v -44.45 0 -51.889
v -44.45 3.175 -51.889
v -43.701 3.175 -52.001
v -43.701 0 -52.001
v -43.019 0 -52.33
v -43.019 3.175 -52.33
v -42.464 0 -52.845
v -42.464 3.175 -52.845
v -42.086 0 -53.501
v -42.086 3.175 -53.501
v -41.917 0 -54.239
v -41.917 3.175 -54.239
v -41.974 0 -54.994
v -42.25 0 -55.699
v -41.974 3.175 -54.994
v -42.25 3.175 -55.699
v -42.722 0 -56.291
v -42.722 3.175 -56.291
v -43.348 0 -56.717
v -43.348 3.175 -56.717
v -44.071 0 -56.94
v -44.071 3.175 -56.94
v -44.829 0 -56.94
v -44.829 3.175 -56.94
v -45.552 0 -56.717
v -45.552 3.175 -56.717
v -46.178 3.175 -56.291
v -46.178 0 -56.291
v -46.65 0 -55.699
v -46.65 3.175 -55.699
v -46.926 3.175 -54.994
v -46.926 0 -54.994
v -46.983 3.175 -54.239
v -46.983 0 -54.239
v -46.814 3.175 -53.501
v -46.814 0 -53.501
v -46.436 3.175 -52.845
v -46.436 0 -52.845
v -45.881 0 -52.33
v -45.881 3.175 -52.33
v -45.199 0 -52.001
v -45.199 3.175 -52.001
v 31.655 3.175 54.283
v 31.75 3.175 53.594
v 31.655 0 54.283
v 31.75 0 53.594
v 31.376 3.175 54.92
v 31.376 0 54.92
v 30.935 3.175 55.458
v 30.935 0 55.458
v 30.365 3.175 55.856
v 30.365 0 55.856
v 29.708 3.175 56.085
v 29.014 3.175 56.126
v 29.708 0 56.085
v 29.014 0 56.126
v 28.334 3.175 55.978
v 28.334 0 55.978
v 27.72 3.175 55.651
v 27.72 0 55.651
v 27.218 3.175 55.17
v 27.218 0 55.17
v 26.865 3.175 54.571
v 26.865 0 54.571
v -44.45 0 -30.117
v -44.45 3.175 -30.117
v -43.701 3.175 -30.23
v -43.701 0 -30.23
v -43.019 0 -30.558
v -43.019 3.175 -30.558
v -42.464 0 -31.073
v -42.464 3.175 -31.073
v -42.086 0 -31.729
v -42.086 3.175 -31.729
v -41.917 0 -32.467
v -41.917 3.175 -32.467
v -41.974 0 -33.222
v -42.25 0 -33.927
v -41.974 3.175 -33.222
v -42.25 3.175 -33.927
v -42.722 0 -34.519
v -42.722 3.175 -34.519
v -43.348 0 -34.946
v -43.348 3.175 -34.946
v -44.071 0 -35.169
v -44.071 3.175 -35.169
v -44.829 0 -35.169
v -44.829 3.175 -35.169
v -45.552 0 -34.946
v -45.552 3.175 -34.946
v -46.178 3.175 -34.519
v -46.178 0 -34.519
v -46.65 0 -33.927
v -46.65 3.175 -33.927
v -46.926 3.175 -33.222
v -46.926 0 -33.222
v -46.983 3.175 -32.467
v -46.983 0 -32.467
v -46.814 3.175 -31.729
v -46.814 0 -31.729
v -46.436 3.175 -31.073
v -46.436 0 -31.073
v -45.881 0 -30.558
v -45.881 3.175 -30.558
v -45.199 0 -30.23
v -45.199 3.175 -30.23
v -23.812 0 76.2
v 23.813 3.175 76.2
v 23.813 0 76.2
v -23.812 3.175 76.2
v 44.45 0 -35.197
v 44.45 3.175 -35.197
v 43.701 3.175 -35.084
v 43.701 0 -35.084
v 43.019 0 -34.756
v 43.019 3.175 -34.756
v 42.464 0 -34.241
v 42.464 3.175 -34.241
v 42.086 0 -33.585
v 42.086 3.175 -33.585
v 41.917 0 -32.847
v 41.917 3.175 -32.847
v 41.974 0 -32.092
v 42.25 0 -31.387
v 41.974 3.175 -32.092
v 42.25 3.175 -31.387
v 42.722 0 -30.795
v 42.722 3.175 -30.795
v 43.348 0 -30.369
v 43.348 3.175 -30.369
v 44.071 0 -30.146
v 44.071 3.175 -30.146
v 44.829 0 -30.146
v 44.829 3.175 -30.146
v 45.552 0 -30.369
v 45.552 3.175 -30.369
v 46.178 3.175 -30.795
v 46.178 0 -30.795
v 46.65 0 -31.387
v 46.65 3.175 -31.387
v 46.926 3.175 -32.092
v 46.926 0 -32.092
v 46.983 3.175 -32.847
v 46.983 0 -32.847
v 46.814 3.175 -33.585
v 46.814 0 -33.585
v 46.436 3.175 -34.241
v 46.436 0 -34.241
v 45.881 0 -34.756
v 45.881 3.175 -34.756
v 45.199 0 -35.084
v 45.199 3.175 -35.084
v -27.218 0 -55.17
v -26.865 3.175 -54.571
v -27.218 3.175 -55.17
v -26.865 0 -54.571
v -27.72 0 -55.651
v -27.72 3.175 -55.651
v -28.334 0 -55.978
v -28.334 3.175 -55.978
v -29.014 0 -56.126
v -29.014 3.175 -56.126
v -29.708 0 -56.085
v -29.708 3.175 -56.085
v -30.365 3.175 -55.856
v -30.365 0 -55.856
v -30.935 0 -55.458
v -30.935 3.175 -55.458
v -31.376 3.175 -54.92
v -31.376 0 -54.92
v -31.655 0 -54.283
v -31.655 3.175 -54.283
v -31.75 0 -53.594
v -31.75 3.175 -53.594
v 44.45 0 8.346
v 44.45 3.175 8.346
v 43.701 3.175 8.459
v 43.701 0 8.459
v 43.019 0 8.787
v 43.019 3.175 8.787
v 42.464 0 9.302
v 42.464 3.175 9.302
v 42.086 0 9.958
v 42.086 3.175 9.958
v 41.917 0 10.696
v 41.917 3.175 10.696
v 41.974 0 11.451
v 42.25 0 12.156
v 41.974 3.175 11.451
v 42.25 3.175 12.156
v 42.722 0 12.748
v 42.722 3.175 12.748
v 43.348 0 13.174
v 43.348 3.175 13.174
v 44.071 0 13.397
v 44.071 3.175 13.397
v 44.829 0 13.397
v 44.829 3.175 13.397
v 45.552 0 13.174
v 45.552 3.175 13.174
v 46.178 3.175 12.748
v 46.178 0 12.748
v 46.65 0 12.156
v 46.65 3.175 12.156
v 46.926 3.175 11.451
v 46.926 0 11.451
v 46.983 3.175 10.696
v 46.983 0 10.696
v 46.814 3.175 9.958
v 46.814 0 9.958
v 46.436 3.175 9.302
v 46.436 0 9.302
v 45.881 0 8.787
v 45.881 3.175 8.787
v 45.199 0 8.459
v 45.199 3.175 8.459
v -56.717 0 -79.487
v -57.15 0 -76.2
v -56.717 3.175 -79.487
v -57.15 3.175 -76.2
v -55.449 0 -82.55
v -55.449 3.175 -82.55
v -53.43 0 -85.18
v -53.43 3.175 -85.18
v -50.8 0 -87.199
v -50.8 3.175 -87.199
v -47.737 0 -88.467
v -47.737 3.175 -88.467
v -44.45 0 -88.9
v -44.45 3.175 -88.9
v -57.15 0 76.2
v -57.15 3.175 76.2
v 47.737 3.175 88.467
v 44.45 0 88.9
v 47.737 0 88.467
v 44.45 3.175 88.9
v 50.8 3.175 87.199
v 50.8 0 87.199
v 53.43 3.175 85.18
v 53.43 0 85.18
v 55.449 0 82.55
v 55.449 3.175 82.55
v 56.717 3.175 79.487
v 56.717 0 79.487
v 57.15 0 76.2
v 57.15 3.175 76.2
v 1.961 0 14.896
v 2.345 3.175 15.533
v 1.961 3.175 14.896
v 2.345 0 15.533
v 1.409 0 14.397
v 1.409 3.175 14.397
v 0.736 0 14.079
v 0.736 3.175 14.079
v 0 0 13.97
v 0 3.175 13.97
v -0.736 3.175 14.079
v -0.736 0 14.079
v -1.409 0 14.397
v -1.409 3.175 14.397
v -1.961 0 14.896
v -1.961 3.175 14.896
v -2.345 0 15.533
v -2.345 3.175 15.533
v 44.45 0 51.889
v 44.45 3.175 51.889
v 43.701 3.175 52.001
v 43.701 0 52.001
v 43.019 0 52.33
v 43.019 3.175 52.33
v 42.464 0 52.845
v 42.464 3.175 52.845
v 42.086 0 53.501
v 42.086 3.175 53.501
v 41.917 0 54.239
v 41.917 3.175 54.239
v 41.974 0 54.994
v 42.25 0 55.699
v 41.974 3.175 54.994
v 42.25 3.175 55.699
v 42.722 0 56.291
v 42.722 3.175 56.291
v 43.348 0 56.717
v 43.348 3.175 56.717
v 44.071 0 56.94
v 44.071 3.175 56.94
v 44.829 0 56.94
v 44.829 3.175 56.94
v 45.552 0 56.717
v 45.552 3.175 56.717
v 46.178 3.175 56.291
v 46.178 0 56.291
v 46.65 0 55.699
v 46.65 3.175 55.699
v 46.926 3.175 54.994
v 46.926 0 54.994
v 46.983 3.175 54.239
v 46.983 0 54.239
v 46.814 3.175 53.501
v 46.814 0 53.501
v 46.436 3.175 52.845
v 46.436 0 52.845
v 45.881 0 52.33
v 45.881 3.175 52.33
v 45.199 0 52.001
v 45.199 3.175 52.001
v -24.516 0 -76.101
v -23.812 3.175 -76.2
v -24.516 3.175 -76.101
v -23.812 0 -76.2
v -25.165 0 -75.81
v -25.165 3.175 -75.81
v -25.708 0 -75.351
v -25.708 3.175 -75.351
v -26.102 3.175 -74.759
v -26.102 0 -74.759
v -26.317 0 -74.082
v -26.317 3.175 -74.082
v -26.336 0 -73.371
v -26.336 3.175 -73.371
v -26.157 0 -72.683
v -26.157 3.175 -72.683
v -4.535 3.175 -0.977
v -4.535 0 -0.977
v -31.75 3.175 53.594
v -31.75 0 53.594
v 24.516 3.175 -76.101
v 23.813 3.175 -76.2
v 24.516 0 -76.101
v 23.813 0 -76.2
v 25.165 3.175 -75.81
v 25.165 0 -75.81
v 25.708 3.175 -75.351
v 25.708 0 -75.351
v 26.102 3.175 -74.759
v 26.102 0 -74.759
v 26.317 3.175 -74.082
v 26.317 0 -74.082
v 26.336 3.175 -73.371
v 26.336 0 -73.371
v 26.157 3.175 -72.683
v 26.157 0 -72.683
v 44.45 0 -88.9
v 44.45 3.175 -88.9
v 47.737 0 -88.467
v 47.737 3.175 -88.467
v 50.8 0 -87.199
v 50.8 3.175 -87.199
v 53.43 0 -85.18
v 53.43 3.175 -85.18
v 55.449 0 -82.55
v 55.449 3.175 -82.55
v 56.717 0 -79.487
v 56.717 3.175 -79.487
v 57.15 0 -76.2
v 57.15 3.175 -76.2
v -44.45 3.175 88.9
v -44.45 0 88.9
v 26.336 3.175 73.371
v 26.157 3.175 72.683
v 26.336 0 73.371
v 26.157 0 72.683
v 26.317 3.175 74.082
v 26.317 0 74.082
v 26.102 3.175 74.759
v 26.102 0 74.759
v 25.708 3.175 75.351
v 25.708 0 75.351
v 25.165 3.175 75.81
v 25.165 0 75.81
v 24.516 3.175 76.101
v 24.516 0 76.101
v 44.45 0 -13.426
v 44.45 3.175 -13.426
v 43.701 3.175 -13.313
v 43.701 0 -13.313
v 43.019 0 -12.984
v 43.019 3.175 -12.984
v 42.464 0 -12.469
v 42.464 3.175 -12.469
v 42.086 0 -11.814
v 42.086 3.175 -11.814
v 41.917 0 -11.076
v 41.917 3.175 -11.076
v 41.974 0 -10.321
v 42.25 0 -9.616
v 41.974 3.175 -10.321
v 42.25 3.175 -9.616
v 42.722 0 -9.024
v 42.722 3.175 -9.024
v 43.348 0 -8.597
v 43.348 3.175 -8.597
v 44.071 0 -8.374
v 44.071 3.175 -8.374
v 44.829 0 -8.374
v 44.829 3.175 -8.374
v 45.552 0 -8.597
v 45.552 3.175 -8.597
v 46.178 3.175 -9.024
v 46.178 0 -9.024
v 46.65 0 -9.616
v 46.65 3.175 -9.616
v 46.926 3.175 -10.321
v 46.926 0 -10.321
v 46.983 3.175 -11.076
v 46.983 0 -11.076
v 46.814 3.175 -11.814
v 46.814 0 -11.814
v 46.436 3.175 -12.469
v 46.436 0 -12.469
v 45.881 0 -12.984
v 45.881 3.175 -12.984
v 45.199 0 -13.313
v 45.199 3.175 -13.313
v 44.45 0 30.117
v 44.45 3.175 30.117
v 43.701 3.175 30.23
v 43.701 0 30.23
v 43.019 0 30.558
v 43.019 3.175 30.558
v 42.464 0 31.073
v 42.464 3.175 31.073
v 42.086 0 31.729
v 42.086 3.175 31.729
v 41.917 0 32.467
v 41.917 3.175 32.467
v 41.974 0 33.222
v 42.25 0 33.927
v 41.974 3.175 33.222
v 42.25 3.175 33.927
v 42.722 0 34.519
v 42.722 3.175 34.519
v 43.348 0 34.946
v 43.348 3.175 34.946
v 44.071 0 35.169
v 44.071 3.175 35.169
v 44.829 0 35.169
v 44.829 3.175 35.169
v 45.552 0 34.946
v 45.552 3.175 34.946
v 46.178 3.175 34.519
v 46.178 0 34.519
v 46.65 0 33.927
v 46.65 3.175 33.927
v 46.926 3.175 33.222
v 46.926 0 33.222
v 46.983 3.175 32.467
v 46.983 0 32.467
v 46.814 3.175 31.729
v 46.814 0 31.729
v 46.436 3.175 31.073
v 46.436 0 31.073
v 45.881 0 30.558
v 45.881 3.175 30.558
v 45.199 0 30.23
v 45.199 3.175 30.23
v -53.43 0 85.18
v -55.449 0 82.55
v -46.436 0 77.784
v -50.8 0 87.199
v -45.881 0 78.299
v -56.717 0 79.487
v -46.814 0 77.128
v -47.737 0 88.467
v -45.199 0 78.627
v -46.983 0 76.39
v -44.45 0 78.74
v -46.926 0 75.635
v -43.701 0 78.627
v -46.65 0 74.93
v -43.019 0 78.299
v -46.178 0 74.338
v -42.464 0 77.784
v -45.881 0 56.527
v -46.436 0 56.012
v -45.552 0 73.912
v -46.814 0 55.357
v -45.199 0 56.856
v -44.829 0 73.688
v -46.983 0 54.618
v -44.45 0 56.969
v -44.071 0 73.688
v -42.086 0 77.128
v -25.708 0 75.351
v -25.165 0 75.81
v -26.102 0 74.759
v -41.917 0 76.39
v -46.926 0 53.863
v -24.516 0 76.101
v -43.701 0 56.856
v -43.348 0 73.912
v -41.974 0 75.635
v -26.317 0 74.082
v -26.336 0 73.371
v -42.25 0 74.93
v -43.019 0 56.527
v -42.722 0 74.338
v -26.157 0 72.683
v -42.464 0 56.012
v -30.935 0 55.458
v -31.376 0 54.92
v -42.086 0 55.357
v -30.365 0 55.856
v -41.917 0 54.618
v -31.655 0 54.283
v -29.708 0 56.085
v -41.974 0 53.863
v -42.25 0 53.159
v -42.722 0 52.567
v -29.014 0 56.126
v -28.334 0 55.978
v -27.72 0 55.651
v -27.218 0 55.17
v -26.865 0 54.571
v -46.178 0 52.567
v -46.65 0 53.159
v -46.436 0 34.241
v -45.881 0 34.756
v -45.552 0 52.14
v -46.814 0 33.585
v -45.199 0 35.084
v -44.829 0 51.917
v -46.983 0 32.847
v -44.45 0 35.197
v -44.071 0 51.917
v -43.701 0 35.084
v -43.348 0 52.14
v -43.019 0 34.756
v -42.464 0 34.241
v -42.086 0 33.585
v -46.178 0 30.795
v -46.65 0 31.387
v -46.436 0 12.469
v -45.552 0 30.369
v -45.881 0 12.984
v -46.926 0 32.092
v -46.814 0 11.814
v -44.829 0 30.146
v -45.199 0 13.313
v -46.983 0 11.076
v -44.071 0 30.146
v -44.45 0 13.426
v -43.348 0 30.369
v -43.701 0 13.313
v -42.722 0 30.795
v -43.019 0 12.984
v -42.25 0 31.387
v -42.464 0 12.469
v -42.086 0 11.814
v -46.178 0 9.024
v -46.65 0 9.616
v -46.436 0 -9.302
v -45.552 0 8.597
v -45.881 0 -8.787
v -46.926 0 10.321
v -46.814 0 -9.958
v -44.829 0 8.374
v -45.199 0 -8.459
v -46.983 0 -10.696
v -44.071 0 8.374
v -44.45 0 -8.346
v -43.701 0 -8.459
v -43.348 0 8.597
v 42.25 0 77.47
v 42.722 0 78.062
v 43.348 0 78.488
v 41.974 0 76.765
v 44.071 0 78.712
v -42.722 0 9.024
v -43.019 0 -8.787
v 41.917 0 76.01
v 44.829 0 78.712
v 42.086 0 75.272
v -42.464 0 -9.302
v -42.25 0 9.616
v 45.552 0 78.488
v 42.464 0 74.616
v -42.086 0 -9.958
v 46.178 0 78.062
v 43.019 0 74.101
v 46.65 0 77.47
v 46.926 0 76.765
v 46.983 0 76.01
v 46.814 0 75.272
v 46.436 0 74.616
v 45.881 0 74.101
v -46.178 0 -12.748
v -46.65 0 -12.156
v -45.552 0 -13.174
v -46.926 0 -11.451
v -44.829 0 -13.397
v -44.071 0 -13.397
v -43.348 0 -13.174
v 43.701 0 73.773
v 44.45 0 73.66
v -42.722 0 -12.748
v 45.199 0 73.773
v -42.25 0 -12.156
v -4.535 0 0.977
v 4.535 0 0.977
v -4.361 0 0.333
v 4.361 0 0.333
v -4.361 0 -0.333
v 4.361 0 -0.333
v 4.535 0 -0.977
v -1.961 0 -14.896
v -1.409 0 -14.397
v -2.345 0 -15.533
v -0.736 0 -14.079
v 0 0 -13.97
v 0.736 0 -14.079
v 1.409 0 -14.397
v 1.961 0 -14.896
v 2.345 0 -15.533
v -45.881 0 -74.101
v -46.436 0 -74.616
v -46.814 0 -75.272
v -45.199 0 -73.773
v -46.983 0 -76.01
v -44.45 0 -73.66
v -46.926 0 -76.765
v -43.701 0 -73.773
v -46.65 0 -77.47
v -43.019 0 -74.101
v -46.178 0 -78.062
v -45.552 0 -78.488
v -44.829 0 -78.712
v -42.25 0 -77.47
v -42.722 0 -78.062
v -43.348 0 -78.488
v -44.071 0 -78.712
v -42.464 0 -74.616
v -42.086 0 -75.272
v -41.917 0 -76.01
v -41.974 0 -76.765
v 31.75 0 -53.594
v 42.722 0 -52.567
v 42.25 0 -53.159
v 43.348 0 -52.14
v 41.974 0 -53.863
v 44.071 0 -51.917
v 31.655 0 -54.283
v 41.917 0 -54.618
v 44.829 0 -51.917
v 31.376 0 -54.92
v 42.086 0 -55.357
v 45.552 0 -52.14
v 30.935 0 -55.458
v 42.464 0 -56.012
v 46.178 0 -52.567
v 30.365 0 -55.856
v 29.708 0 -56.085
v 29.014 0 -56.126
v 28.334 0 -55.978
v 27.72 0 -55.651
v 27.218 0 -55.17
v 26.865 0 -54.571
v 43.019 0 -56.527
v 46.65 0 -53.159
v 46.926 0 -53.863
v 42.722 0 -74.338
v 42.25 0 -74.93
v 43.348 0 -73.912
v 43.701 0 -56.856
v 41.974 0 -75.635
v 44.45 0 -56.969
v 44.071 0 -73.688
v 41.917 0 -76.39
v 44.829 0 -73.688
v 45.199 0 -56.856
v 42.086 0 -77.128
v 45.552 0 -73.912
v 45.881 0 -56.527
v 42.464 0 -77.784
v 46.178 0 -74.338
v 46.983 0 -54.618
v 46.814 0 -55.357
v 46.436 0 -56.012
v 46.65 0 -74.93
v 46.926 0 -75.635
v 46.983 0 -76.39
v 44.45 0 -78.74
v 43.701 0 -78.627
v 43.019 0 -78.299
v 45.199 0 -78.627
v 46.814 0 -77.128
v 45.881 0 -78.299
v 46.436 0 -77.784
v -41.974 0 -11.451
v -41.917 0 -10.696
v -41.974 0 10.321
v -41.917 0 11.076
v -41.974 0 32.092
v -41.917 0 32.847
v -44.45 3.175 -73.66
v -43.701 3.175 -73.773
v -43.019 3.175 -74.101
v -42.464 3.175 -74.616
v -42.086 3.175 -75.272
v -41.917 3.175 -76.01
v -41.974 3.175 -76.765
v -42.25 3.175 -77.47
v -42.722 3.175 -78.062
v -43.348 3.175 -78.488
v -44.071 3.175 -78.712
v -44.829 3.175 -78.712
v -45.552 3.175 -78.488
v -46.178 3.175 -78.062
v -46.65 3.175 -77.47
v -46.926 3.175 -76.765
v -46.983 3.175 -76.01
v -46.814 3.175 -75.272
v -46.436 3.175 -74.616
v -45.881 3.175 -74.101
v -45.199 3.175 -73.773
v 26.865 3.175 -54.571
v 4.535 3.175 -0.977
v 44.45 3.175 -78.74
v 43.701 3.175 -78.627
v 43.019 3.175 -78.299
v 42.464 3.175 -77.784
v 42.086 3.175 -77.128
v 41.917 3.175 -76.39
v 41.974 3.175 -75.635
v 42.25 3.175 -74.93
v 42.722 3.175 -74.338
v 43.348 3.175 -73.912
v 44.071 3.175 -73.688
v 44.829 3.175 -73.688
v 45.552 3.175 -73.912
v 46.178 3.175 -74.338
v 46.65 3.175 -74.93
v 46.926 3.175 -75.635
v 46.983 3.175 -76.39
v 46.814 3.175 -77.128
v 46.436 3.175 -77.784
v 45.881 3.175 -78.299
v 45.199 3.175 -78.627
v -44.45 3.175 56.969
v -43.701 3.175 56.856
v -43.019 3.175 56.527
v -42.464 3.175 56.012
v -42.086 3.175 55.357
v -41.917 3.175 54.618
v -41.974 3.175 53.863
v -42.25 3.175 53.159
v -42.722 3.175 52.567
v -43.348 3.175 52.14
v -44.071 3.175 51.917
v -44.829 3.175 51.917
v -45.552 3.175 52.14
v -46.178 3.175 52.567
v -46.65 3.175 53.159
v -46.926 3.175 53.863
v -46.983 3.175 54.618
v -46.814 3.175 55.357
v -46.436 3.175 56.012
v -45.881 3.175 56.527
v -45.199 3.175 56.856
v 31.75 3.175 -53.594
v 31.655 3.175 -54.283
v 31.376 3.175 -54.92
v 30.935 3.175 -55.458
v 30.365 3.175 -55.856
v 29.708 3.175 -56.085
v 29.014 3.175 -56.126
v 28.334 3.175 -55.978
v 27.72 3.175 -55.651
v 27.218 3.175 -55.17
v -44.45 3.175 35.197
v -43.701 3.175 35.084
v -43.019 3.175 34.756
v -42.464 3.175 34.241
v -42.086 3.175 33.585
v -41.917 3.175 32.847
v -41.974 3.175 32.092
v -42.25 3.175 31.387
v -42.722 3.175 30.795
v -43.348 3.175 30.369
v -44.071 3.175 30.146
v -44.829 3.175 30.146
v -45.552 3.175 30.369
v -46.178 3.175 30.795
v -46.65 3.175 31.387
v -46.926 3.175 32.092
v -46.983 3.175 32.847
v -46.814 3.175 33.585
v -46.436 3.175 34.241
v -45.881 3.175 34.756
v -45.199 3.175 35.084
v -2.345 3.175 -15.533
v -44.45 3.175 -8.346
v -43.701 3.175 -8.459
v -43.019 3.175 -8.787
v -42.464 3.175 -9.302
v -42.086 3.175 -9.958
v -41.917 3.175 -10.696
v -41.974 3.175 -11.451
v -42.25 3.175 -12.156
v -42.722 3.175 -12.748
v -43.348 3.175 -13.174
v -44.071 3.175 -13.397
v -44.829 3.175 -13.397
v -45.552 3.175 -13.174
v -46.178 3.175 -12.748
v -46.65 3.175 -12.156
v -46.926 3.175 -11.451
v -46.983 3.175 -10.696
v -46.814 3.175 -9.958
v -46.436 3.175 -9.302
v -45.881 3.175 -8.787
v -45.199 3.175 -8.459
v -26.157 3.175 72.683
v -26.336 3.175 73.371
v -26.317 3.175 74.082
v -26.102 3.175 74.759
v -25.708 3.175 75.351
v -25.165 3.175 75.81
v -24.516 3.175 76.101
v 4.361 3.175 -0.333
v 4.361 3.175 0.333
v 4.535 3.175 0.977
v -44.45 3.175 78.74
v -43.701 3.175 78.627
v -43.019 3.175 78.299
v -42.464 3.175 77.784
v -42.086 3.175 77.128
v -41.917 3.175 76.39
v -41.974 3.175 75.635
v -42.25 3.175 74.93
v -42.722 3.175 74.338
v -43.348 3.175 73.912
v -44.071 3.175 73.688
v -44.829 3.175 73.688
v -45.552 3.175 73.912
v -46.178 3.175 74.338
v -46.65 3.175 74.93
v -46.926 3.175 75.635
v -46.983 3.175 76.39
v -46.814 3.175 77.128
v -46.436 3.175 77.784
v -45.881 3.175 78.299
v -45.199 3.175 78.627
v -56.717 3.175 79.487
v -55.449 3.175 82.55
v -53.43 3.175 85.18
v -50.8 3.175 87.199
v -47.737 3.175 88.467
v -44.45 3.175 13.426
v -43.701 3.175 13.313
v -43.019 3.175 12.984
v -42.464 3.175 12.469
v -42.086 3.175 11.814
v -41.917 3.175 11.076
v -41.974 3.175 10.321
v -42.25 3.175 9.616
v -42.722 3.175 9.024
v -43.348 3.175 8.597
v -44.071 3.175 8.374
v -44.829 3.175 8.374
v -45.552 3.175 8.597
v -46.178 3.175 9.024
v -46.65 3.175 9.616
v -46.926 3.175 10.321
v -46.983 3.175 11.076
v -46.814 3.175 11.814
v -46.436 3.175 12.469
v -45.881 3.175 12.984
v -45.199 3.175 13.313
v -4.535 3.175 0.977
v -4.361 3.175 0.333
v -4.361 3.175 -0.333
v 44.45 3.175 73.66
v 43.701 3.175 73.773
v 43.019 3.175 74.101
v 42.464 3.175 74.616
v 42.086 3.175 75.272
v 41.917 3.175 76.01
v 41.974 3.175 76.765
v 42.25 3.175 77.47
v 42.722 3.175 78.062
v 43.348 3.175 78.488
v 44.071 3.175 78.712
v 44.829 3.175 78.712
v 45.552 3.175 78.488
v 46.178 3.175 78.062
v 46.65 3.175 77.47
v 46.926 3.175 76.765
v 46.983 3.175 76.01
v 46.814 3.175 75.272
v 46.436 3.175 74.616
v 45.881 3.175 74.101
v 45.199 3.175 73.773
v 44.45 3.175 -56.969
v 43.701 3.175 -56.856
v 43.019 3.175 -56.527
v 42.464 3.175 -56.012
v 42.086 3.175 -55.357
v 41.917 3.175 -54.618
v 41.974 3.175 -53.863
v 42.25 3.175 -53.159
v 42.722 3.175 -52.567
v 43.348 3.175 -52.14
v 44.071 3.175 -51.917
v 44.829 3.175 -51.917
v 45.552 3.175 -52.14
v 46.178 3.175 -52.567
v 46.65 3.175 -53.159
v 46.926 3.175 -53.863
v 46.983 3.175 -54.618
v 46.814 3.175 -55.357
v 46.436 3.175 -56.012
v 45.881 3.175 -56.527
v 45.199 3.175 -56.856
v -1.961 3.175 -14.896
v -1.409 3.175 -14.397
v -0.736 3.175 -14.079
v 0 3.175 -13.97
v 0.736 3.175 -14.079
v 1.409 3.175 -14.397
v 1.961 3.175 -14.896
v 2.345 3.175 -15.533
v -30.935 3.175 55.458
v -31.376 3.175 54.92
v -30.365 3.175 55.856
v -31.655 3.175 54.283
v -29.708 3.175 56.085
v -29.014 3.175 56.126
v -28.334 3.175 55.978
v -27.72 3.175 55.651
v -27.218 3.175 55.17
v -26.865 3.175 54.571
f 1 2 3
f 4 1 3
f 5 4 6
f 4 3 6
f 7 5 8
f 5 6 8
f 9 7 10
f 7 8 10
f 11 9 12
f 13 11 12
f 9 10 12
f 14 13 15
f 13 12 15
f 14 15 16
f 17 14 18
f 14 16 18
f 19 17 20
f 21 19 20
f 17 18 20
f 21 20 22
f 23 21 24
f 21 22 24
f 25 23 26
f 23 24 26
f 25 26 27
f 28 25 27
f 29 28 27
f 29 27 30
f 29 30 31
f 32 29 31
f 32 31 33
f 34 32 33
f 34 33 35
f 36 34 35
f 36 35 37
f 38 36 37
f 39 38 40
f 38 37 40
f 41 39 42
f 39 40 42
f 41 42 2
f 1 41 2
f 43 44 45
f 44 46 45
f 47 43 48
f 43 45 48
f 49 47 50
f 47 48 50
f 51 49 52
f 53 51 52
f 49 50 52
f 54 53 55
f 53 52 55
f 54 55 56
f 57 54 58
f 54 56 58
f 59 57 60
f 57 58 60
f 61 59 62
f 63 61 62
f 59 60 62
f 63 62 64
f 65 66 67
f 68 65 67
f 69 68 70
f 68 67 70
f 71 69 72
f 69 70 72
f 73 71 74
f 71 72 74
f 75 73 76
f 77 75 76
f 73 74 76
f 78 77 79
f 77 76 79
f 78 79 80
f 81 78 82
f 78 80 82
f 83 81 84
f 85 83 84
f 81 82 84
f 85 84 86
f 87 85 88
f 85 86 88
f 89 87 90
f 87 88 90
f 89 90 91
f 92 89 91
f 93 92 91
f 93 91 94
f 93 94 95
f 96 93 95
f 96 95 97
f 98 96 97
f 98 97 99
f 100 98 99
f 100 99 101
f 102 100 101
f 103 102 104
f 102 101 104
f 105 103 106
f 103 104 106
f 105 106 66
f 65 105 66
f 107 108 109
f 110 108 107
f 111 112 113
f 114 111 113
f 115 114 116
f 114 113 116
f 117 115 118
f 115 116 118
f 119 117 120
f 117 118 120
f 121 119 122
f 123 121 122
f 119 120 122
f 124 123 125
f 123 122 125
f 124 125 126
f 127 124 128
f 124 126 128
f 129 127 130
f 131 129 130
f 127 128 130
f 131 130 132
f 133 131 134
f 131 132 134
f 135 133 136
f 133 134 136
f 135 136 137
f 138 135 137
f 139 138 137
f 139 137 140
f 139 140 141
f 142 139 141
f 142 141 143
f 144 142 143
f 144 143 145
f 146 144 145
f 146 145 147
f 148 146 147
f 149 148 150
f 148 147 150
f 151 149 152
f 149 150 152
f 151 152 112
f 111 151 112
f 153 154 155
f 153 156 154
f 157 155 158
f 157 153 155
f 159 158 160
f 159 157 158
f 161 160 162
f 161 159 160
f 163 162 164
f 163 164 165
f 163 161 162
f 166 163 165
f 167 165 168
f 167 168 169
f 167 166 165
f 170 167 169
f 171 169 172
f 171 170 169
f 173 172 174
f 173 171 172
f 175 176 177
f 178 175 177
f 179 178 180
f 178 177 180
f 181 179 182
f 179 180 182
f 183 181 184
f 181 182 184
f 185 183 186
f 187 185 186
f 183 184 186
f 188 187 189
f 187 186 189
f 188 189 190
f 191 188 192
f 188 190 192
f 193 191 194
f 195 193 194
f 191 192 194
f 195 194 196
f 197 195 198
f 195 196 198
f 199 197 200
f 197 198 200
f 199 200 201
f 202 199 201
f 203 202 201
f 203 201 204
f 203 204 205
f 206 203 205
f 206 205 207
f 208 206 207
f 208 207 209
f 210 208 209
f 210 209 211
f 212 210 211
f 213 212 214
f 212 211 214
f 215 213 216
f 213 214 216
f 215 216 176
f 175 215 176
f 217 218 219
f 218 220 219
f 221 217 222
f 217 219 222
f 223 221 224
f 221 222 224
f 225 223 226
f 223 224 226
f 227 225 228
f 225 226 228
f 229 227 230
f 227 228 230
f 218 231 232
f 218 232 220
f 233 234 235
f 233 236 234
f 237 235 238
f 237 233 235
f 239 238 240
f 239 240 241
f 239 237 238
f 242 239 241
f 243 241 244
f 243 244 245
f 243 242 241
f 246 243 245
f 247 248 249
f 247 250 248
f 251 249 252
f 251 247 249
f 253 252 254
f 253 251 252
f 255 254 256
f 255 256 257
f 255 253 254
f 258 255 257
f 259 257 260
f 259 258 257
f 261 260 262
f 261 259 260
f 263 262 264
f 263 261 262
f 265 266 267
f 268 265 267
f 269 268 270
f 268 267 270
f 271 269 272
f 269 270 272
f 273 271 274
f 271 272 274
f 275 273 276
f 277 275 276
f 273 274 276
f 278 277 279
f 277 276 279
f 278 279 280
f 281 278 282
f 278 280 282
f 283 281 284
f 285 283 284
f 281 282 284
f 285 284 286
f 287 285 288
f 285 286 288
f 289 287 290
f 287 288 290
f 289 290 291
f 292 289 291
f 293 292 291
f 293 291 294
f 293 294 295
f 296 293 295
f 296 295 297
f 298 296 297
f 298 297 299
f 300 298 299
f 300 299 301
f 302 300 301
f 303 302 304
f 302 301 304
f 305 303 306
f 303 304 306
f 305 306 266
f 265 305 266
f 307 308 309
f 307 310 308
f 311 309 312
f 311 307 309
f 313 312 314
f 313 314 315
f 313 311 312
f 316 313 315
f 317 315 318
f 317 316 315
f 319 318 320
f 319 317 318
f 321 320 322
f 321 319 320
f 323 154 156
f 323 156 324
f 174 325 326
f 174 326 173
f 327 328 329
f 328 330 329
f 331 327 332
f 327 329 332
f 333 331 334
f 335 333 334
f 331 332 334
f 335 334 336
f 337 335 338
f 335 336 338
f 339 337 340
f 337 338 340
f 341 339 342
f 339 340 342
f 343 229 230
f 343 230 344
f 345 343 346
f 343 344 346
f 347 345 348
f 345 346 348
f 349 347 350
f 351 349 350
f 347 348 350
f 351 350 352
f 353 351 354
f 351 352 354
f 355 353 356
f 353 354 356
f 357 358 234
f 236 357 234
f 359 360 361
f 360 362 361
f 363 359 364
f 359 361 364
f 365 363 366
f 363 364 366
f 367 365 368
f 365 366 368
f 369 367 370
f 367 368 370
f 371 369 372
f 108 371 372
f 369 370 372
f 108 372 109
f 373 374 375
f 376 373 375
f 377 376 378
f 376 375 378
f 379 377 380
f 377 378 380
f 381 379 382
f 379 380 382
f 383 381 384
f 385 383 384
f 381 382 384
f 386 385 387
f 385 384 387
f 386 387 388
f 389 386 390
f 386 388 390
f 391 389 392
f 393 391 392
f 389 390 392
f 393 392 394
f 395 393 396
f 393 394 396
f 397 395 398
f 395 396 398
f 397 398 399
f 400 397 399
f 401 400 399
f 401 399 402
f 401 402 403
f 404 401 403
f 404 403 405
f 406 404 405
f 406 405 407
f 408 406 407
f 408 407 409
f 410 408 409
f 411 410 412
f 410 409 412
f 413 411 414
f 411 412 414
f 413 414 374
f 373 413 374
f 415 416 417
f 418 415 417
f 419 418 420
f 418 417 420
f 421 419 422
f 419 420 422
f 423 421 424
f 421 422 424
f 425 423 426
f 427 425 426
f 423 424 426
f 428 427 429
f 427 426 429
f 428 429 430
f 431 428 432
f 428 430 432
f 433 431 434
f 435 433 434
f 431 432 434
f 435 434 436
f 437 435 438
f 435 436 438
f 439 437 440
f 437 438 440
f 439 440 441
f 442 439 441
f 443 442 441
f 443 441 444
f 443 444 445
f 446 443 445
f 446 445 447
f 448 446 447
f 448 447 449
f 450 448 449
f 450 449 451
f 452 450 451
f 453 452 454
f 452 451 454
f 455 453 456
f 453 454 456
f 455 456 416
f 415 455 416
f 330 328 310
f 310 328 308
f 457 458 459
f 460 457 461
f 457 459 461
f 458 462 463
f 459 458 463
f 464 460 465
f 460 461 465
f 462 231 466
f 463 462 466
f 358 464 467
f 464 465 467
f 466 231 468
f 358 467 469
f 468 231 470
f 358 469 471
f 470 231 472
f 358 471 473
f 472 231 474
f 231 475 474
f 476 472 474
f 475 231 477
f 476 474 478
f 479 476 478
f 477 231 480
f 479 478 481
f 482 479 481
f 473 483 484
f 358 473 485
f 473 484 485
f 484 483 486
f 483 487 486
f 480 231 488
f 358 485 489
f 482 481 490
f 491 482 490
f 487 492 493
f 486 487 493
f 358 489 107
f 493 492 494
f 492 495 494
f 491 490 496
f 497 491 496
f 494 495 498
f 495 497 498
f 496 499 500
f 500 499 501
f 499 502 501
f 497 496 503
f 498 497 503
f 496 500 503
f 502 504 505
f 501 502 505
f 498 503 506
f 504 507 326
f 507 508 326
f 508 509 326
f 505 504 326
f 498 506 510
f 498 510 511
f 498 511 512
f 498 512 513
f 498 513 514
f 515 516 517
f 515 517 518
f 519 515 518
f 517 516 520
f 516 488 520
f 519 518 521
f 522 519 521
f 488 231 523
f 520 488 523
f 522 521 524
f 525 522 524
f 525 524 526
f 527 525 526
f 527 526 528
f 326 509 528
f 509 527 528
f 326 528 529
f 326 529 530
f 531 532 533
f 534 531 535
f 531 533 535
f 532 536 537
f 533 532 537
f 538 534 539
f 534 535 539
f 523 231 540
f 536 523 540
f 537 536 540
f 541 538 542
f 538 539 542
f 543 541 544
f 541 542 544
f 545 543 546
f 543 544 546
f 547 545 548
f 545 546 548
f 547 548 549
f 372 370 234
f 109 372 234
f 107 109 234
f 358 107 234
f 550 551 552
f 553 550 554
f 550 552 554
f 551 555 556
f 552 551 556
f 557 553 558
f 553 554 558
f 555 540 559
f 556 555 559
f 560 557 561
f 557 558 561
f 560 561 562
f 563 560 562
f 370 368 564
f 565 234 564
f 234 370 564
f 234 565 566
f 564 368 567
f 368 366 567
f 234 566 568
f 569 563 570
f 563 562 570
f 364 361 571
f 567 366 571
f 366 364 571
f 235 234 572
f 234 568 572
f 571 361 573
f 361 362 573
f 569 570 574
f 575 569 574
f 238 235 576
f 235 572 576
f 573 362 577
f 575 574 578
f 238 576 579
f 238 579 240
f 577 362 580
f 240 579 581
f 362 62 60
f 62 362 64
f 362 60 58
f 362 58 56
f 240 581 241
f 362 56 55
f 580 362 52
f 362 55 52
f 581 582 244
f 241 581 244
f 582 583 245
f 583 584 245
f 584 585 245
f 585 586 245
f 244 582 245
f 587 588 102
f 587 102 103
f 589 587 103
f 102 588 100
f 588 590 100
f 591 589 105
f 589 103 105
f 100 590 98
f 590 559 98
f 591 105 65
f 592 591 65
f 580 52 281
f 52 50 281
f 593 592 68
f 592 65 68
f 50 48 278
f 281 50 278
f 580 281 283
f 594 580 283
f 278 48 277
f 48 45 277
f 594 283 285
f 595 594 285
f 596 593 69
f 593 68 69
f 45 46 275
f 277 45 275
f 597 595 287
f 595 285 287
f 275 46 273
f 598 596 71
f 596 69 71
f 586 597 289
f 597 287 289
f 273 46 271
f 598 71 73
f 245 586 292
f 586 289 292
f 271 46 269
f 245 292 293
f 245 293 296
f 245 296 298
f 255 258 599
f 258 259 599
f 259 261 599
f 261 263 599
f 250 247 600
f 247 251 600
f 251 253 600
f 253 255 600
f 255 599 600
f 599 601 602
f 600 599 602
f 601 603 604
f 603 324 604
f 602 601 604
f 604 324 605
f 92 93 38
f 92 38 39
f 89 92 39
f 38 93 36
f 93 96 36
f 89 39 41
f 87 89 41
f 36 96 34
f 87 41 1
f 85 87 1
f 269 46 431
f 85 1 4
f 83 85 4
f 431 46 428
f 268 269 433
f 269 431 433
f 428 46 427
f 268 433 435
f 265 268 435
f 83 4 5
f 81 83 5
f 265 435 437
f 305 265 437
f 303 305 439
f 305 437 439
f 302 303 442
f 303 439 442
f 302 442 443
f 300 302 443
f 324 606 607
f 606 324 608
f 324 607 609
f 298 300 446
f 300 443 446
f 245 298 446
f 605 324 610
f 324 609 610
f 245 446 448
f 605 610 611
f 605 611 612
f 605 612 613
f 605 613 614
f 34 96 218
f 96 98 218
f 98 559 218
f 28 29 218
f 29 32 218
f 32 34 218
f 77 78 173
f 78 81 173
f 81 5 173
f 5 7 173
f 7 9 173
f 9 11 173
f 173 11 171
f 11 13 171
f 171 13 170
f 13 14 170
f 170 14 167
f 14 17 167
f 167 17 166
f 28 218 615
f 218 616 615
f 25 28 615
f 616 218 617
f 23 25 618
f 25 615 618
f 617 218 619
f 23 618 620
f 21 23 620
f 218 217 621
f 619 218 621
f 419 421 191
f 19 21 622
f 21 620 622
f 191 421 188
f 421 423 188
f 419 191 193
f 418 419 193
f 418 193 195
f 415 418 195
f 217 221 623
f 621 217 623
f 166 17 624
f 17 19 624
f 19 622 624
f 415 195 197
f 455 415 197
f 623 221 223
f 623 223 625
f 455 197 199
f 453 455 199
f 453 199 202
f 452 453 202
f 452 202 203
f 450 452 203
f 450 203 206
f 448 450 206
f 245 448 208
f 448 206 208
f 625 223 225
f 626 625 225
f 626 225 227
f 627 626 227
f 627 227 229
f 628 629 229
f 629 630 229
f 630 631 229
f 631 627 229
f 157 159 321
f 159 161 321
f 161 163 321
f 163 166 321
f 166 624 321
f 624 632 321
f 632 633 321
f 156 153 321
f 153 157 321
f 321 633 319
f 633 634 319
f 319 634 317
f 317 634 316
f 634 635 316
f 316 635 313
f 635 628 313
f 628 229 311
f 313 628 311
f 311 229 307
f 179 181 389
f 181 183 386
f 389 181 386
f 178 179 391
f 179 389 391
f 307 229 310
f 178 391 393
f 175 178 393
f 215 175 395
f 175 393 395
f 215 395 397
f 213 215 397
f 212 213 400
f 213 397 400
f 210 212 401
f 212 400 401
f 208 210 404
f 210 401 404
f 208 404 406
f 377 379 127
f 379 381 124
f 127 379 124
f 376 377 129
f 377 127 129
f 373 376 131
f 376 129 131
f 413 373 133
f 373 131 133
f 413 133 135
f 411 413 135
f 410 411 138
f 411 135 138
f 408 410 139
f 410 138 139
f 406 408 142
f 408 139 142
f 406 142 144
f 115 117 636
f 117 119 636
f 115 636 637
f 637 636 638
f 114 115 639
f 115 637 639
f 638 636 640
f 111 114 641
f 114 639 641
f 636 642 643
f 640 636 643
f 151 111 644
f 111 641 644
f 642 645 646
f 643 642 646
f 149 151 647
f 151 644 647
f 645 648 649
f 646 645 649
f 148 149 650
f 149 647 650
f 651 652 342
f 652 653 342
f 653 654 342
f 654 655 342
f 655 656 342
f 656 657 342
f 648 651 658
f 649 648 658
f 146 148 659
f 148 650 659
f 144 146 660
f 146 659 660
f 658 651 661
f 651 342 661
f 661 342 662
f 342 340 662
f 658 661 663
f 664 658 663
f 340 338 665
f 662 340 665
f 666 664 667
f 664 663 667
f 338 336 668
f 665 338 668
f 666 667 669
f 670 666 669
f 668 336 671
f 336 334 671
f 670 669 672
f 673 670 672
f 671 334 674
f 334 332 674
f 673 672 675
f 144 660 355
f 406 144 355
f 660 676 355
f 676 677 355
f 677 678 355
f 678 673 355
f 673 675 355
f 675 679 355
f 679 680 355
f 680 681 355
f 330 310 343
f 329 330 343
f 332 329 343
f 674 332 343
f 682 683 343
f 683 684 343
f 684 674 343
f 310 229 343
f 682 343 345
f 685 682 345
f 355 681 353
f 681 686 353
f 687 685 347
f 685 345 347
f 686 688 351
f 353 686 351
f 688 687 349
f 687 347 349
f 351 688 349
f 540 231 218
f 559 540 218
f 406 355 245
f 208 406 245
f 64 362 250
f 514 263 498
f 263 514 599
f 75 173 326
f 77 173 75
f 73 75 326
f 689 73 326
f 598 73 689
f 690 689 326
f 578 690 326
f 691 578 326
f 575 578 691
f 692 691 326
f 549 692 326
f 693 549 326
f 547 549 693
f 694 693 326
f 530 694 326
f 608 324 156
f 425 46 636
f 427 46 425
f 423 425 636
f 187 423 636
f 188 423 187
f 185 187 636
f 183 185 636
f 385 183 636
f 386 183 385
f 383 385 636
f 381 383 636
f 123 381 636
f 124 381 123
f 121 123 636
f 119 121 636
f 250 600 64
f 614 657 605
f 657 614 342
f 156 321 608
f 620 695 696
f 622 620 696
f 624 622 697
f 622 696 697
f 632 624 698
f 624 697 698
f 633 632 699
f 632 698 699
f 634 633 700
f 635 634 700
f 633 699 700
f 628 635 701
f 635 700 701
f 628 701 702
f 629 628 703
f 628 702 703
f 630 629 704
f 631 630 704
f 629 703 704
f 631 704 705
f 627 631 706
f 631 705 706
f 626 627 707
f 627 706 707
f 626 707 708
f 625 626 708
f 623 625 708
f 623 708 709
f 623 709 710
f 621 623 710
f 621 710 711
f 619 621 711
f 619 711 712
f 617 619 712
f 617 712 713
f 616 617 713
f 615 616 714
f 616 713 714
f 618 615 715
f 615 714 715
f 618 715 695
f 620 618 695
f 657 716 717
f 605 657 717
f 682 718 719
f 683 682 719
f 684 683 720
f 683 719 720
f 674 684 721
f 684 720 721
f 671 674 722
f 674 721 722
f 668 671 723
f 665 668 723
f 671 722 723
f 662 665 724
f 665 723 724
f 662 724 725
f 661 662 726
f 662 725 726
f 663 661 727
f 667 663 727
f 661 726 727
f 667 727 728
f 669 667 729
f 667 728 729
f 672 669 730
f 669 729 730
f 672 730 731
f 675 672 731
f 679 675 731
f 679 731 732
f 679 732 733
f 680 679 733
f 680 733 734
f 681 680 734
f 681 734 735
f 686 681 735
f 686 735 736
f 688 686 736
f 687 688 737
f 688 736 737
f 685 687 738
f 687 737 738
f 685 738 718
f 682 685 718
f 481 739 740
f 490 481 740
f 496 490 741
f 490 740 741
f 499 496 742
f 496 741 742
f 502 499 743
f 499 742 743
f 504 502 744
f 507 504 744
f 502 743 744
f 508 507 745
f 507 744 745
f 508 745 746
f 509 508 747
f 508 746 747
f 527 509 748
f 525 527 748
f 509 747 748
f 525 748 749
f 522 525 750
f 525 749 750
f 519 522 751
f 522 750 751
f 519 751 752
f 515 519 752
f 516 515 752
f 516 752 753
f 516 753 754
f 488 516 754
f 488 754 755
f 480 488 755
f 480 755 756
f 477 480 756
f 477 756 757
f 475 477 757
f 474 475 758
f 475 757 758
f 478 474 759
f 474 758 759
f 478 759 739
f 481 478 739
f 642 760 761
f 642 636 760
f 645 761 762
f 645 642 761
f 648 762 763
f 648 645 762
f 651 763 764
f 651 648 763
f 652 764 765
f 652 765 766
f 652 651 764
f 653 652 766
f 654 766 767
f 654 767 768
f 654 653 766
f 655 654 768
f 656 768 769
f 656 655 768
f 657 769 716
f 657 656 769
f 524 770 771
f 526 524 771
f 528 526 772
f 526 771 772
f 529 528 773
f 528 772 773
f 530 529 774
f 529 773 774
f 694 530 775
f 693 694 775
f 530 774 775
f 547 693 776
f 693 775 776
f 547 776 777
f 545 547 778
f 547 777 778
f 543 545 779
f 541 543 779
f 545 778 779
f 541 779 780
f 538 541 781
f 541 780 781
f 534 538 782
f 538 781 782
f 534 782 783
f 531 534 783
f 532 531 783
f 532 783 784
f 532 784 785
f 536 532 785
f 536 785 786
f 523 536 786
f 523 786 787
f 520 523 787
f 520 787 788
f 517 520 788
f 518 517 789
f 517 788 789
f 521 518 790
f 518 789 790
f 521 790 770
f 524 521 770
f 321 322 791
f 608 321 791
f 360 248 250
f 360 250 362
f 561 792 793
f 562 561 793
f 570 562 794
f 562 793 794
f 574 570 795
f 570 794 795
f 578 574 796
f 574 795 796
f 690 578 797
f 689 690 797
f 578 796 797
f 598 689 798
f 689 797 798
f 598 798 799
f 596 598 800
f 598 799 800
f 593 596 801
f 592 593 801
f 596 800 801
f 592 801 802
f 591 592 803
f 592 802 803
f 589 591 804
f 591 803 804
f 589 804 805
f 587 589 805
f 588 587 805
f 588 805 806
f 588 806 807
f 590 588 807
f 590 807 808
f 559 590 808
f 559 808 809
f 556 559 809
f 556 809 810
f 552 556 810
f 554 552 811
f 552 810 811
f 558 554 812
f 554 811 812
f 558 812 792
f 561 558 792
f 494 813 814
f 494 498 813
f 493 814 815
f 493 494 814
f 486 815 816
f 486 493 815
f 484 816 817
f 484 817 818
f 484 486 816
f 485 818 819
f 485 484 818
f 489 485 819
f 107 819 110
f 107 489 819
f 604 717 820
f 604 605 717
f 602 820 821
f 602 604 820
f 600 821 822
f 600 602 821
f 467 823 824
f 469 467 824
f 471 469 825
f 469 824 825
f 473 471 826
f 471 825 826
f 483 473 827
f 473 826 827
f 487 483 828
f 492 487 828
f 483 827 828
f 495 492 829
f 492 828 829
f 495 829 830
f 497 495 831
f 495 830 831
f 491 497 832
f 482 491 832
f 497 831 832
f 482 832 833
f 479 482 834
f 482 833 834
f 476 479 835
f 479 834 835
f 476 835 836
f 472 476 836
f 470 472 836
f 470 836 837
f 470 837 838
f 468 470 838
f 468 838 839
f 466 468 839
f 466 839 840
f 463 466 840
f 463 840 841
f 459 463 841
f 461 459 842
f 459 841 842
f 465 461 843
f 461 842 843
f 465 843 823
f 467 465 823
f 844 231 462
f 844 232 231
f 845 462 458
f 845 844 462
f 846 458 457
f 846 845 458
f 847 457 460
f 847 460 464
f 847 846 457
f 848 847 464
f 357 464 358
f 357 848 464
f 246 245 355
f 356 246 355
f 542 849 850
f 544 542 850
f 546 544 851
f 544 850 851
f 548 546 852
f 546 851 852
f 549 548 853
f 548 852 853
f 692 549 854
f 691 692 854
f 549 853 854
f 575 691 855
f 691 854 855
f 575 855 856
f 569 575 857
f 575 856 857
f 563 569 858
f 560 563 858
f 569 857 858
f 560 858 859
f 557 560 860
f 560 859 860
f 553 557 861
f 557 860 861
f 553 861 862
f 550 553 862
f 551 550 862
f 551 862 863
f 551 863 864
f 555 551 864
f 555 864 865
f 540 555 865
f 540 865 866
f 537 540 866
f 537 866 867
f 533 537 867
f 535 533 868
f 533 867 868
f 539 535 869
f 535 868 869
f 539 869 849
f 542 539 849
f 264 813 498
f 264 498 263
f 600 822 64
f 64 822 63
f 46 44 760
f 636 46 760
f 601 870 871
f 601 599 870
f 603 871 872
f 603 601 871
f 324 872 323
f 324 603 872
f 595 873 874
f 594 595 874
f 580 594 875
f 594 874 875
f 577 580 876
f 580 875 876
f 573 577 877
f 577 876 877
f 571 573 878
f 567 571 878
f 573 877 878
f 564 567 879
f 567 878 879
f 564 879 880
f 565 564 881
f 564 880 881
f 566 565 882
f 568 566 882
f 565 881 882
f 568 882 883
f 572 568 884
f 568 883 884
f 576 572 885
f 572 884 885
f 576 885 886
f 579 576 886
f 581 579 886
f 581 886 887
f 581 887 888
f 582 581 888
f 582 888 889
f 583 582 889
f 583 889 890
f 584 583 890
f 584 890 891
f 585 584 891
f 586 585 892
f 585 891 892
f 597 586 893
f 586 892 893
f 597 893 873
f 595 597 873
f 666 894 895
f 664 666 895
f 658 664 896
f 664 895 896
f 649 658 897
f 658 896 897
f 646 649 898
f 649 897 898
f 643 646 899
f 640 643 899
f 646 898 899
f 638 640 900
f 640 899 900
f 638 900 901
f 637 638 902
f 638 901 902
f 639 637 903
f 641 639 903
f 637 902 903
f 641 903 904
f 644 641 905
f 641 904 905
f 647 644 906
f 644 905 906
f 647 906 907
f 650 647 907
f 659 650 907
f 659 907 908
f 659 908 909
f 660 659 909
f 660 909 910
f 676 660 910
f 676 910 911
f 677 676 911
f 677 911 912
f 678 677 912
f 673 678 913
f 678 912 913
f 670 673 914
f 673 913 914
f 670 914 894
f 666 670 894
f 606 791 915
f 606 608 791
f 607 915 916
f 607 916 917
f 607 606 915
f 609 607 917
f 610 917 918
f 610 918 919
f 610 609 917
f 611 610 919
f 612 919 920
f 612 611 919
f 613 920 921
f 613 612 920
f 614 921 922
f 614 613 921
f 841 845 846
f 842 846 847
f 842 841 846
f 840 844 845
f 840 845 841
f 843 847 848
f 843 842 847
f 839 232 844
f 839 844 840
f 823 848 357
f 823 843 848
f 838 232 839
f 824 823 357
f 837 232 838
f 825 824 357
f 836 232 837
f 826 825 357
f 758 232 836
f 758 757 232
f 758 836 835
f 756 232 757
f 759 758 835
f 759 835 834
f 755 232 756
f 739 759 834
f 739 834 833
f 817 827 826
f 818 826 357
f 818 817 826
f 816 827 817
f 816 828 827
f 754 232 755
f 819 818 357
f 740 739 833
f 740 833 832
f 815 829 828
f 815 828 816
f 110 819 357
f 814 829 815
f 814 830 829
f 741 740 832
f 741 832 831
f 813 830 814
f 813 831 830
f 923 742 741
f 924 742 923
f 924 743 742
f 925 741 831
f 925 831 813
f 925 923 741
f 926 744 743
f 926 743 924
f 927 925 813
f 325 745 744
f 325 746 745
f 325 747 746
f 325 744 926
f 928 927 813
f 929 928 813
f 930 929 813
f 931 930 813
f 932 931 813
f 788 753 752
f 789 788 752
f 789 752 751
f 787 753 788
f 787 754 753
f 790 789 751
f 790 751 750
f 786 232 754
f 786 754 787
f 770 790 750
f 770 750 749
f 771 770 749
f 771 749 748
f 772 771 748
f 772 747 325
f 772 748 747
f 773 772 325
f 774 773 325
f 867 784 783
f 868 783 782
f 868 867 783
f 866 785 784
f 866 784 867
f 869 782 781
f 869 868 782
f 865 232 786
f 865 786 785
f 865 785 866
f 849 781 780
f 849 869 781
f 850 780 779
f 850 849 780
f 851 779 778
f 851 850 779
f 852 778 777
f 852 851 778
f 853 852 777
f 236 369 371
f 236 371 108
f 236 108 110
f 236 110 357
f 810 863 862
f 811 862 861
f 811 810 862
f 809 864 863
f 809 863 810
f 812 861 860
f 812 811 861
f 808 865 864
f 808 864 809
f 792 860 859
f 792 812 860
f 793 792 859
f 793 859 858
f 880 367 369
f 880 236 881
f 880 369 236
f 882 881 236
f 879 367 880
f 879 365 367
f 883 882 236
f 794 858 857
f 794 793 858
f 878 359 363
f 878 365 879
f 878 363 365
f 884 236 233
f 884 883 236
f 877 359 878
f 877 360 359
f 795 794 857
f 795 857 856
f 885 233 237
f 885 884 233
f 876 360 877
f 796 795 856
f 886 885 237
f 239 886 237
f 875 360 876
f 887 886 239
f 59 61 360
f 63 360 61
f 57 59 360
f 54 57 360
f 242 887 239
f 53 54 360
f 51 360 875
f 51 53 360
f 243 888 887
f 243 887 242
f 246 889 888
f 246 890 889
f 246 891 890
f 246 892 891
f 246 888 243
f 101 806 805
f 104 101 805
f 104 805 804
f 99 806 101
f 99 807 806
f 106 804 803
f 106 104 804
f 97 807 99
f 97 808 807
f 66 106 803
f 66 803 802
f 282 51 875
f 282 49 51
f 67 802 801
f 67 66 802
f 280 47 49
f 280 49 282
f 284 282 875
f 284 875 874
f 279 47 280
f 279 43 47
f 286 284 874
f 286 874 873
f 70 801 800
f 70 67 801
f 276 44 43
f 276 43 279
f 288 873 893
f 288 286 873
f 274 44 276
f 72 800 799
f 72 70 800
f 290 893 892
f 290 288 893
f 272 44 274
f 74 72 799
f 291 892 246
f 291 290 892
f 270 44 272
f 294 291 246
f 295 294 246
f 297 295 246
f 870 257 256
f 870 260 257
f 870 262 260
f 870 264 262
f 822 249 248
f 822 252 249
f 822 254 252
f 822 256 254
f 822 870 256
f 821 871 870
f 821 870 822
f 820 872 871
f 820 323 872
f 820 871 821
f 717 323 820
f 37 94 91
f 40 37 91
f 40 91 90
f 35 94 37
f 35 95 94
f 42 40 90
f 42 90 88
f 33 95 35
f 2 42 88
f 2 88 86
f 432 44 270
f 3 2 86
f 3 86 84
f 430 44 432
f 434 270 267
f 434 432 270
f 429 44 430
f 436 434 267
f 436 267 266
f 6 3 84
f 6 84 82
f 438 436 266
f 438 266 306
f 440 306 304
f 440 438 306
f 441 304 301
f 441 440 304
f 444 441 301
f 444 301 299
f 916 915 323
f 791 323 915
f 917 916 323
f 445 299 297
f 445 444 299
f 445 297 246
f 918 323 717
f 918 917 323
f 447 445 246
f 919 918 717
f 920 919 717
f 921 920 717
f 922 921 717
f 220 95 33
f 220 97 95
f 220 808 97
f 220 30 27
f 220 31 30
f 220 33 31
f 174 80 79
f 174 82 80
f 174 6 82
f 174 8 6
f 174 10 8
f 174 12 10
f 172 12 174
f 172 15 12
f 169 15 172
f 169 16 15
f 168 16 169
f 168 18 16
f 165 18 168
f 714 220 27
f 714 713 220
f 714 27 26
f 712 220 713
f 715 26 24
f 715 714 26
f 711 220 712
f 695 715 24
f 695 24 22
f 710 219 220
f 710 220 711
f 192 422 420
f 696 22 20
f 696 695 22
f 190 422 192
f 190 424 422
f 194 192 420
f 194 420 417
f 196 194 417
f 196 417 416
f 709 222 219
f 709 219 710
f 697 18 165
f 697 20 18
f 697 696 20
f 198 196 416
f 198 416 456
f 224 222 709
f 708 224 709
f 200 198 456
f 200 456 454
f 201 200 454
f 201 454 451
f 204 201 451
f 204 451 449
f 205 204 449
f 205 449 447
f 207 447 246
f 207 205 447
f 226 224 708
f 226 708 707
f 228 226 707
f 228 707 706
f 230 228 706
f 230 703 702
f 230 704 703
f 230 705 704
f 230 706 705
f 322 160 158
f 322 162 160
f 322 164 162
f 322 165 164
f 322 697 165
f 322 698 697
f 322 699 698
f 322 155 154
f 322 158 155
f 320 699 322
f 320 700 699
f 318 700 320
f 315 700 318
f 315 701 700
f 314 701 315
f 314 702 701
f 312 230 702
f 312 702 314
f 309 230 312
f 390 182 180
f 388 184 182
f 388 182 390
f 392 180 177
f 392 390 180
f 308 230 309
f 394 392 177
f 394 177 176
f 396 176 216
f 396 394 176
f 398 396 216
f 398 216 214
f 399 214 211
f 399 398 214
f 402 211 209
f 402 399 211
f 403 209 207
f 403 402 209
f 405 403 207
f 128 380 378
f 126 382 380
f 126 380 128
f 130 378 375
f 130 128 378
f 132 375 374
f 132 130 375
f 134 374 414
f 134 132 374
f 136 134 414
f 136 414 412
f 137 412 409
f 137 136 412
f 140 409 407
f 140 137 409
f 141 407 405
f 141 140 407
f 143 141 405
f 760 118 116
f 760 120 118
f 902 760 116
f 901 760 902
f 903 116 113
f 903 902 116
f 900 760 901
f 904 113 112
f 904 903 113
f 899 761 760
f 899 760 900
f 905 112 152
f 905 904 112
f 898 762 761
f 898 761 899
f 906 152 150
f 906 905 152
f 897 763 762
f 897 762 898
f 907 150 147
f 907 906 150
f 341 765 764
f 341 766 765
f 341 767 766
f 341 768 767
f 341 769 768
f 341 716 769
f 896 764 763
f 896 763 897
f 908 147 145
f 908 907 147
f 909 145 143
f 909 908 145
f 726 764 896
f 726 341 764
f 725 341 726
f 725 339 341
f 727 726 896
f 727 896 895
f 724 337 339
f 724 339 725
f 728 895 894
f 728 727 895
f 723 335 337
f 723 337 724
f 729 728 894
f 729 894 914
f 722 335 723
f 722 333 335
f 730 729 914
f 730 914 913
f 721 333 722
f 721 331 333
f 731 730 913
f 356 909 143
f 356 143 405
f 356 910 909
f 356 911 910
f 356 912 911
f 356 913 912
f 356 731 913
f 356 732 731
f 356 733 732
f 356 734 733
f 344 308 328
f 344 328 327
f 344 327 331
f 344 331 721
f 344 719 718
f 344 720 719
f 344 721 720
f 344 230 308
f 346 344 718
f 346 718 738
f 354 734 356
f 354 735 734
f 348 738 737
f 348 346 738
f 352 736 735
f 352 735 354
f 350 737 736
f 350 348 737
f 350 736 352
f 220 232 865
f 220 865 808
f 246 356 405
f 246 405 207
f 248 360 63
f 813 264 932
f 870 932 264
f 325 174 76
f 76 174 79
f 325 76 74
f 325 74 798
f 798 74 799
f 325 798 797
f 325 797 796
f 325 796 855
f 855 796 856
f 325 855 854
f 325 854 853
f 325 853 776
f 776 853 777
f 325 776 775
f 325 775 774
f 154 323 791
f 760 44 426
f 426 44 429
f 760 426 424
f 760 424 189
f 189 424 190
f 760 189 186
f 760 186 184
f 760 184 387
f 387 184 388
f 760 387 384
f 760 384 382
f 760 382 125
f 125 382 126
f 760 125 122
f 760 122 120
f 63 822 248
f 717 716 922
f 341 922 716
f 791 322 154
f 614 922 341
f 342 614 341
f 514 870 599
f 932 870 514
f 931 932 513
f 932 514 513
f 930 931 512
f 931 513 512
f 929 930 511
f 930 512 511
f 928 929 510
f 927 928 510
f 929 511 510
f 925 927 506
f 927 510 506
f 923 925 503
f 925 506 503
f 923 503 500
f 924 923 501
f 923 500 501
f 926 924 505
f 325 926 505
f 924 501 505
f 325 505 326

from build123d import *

# Parameters (mm, degrees)
SKETCH1_W           = 114.3
SKETCH1_H           = 177.8
BOSS_EXTRUDE1_DEPTH = 3.175
SKETCH2_R           = 2.54
CUT_EXTRUDE1_DEPTH  = 3.175
FILLET1_R           = 12.7
CUT_EXTRUDE2_DEPTH  = 106.732743864
FILLET2_R           = 2.54


with BuildPart() as part:
    # Sketch1 → Boss-Extrude1 (new body)
    with BuildSketch(Plane(origin=(0, 0, 0), x_dir=(1, 0, 0), z_dir=(0, 1, 0))):
        Rectangle(SKETCH1_W, SKETCH1_H)
    extrude(amount=BOSS_EXTRUDE1_DEPTH)

    # Sketch2 → Cut-Extrude1 (cut)
    with BuildSketch(Plane(origin=(0, 3.175, 0), x_dir=(1, 0, 0), z_dir=(0, 1, 0))):
        with Locations(Location((-44.45, 76.2, 0), (0, 0, 270))):
            Circle(SKETCH2_R)
        with Locations(Location((-44.45, 54.428571429, 0), (0, 0, 270))):
            Circle(SKETCH2_R)
        with Locations(Location((-44.45, 32.657142857, 0), (0, 0, 270))):
            Circle(SKETCH2_R)
        with Locations(Location((-44.45, 10.885714286, 0), (0, 0, 270))):
            Circle(SKETCH2_R)
        with Locations(Location((-44.45, -10.885714286, 0), (0, 0, 270))):
            Circle(SKETCH2_R)
        with Locations(Location((-44.45, -32.657142857, 0), (0, 0, 270))):
            Circle(SKETCH2_R)
        with Locations(Location((-44.45, -54.428571429, 0), (0, 0, 270))):
            Circle(SKETCH2_R)
        with Locations(Location((-44.45, -76.2, 0), (0, 0, 270))):
            Circle(SKETCH2_R)
        with Locations(Location((44.45, -76.2, 0), (0, 0, 90))):
            Circle(SKETCH2_R)
        with Locations(Location((44.45, -54.428571429, 0), (0, 0, 90))):
            Circle(SKETCH2_R)
        with Locations(Location((44.45, -32.657142857, 0), (0, 0, 90))):
            Circle(SKETCH2_R)
        with Locations(Location((44.45, -10.885714286, 0), (0, 0, 90))):
            Circle(SKETCH2_R)
        with Locations(Location((44.45, 10.885714286, 0), (0, 0, 90))):
            Circle(SKETCH2_R)
        with Locations(Location((44.45, 32.657142857, 0), (0, 0, 90))):
            Circle(SKETCH2_R)
        with Locations(Location((44.45, 54.428571429, 0), (0, 0, 90))):
            Circle(SKETCH2_R)
        with Locations(Location((44.45, 76.2, 0), (0, 0, 90))):
            Circle(SKETCH2_R)
    extrude(amount=-CUT_EXTRUDE1_DEPTH, mode=Mode.SUBTRACT)

    # Fillet1
    fillet1_edges = [part.edges().sort_by_distance(p)[0] for p in [
        (57.15, 1.5875, 88.9),
        (-57.15, 1.5875, 88.9),
        (-57.15, 1.5875, -88.9),
        (57.15, 1.5875, -88.9),
    ]]
    fillet(fillet1_edges, radius=FILLET1_R)

    # Sketch3 → Cut-Extrude2 (cut, through all)
    with BuildSketch(Plane(origin=(0, 3.175, 0), x_dir=(1, 0, 0), z_dir=(0, 1, 0))):
        Polygon((27.6225, -76.2), (-27.6225, -76.2), (0, -9.906), align=None)
        Polygon((31.75, -66.294), (31.75, 66.294), (4.1275, 0), align=None)
        Polygon((27.6225, 76.2), (-27.6225, 76.2), (0, 9.906), align=None)
        Polygon((-31.75, -66.294), (-31.75, 66.294), (-4.1275, 0), align=None)
    extrude(amount=-CUT_EXTRUDE2_DEPTH, mode=Mode.SUBTRACT)

    # Fillet2
    fillet2_edges = [part.edges().sort_by_distance(p)[0] for p in [
        (31.75, 1.5875, 66.294),
        (4.1275, 1.5875, 0),
        (31.75, 1.5875, -66.294),
        (-4.1275, 1.5875, 0),
        (-31.75, 1.5875, 66.294),
        (-31.75, 1.5875, -66.294),
        (0, 1.5875, -9.906),
        (-27.6225, 1.5875, -76.2),
        (27.6225, 1.5875, -76.2),
        (0, 1.5875, 9.906),
        (27.6225, 1.5875, 76.2),
        (-27.6225, 1.5875, 76.2),
    ]]
    fillet(fillet2_edges, radius=FILLET2_R)


solid = part.part
